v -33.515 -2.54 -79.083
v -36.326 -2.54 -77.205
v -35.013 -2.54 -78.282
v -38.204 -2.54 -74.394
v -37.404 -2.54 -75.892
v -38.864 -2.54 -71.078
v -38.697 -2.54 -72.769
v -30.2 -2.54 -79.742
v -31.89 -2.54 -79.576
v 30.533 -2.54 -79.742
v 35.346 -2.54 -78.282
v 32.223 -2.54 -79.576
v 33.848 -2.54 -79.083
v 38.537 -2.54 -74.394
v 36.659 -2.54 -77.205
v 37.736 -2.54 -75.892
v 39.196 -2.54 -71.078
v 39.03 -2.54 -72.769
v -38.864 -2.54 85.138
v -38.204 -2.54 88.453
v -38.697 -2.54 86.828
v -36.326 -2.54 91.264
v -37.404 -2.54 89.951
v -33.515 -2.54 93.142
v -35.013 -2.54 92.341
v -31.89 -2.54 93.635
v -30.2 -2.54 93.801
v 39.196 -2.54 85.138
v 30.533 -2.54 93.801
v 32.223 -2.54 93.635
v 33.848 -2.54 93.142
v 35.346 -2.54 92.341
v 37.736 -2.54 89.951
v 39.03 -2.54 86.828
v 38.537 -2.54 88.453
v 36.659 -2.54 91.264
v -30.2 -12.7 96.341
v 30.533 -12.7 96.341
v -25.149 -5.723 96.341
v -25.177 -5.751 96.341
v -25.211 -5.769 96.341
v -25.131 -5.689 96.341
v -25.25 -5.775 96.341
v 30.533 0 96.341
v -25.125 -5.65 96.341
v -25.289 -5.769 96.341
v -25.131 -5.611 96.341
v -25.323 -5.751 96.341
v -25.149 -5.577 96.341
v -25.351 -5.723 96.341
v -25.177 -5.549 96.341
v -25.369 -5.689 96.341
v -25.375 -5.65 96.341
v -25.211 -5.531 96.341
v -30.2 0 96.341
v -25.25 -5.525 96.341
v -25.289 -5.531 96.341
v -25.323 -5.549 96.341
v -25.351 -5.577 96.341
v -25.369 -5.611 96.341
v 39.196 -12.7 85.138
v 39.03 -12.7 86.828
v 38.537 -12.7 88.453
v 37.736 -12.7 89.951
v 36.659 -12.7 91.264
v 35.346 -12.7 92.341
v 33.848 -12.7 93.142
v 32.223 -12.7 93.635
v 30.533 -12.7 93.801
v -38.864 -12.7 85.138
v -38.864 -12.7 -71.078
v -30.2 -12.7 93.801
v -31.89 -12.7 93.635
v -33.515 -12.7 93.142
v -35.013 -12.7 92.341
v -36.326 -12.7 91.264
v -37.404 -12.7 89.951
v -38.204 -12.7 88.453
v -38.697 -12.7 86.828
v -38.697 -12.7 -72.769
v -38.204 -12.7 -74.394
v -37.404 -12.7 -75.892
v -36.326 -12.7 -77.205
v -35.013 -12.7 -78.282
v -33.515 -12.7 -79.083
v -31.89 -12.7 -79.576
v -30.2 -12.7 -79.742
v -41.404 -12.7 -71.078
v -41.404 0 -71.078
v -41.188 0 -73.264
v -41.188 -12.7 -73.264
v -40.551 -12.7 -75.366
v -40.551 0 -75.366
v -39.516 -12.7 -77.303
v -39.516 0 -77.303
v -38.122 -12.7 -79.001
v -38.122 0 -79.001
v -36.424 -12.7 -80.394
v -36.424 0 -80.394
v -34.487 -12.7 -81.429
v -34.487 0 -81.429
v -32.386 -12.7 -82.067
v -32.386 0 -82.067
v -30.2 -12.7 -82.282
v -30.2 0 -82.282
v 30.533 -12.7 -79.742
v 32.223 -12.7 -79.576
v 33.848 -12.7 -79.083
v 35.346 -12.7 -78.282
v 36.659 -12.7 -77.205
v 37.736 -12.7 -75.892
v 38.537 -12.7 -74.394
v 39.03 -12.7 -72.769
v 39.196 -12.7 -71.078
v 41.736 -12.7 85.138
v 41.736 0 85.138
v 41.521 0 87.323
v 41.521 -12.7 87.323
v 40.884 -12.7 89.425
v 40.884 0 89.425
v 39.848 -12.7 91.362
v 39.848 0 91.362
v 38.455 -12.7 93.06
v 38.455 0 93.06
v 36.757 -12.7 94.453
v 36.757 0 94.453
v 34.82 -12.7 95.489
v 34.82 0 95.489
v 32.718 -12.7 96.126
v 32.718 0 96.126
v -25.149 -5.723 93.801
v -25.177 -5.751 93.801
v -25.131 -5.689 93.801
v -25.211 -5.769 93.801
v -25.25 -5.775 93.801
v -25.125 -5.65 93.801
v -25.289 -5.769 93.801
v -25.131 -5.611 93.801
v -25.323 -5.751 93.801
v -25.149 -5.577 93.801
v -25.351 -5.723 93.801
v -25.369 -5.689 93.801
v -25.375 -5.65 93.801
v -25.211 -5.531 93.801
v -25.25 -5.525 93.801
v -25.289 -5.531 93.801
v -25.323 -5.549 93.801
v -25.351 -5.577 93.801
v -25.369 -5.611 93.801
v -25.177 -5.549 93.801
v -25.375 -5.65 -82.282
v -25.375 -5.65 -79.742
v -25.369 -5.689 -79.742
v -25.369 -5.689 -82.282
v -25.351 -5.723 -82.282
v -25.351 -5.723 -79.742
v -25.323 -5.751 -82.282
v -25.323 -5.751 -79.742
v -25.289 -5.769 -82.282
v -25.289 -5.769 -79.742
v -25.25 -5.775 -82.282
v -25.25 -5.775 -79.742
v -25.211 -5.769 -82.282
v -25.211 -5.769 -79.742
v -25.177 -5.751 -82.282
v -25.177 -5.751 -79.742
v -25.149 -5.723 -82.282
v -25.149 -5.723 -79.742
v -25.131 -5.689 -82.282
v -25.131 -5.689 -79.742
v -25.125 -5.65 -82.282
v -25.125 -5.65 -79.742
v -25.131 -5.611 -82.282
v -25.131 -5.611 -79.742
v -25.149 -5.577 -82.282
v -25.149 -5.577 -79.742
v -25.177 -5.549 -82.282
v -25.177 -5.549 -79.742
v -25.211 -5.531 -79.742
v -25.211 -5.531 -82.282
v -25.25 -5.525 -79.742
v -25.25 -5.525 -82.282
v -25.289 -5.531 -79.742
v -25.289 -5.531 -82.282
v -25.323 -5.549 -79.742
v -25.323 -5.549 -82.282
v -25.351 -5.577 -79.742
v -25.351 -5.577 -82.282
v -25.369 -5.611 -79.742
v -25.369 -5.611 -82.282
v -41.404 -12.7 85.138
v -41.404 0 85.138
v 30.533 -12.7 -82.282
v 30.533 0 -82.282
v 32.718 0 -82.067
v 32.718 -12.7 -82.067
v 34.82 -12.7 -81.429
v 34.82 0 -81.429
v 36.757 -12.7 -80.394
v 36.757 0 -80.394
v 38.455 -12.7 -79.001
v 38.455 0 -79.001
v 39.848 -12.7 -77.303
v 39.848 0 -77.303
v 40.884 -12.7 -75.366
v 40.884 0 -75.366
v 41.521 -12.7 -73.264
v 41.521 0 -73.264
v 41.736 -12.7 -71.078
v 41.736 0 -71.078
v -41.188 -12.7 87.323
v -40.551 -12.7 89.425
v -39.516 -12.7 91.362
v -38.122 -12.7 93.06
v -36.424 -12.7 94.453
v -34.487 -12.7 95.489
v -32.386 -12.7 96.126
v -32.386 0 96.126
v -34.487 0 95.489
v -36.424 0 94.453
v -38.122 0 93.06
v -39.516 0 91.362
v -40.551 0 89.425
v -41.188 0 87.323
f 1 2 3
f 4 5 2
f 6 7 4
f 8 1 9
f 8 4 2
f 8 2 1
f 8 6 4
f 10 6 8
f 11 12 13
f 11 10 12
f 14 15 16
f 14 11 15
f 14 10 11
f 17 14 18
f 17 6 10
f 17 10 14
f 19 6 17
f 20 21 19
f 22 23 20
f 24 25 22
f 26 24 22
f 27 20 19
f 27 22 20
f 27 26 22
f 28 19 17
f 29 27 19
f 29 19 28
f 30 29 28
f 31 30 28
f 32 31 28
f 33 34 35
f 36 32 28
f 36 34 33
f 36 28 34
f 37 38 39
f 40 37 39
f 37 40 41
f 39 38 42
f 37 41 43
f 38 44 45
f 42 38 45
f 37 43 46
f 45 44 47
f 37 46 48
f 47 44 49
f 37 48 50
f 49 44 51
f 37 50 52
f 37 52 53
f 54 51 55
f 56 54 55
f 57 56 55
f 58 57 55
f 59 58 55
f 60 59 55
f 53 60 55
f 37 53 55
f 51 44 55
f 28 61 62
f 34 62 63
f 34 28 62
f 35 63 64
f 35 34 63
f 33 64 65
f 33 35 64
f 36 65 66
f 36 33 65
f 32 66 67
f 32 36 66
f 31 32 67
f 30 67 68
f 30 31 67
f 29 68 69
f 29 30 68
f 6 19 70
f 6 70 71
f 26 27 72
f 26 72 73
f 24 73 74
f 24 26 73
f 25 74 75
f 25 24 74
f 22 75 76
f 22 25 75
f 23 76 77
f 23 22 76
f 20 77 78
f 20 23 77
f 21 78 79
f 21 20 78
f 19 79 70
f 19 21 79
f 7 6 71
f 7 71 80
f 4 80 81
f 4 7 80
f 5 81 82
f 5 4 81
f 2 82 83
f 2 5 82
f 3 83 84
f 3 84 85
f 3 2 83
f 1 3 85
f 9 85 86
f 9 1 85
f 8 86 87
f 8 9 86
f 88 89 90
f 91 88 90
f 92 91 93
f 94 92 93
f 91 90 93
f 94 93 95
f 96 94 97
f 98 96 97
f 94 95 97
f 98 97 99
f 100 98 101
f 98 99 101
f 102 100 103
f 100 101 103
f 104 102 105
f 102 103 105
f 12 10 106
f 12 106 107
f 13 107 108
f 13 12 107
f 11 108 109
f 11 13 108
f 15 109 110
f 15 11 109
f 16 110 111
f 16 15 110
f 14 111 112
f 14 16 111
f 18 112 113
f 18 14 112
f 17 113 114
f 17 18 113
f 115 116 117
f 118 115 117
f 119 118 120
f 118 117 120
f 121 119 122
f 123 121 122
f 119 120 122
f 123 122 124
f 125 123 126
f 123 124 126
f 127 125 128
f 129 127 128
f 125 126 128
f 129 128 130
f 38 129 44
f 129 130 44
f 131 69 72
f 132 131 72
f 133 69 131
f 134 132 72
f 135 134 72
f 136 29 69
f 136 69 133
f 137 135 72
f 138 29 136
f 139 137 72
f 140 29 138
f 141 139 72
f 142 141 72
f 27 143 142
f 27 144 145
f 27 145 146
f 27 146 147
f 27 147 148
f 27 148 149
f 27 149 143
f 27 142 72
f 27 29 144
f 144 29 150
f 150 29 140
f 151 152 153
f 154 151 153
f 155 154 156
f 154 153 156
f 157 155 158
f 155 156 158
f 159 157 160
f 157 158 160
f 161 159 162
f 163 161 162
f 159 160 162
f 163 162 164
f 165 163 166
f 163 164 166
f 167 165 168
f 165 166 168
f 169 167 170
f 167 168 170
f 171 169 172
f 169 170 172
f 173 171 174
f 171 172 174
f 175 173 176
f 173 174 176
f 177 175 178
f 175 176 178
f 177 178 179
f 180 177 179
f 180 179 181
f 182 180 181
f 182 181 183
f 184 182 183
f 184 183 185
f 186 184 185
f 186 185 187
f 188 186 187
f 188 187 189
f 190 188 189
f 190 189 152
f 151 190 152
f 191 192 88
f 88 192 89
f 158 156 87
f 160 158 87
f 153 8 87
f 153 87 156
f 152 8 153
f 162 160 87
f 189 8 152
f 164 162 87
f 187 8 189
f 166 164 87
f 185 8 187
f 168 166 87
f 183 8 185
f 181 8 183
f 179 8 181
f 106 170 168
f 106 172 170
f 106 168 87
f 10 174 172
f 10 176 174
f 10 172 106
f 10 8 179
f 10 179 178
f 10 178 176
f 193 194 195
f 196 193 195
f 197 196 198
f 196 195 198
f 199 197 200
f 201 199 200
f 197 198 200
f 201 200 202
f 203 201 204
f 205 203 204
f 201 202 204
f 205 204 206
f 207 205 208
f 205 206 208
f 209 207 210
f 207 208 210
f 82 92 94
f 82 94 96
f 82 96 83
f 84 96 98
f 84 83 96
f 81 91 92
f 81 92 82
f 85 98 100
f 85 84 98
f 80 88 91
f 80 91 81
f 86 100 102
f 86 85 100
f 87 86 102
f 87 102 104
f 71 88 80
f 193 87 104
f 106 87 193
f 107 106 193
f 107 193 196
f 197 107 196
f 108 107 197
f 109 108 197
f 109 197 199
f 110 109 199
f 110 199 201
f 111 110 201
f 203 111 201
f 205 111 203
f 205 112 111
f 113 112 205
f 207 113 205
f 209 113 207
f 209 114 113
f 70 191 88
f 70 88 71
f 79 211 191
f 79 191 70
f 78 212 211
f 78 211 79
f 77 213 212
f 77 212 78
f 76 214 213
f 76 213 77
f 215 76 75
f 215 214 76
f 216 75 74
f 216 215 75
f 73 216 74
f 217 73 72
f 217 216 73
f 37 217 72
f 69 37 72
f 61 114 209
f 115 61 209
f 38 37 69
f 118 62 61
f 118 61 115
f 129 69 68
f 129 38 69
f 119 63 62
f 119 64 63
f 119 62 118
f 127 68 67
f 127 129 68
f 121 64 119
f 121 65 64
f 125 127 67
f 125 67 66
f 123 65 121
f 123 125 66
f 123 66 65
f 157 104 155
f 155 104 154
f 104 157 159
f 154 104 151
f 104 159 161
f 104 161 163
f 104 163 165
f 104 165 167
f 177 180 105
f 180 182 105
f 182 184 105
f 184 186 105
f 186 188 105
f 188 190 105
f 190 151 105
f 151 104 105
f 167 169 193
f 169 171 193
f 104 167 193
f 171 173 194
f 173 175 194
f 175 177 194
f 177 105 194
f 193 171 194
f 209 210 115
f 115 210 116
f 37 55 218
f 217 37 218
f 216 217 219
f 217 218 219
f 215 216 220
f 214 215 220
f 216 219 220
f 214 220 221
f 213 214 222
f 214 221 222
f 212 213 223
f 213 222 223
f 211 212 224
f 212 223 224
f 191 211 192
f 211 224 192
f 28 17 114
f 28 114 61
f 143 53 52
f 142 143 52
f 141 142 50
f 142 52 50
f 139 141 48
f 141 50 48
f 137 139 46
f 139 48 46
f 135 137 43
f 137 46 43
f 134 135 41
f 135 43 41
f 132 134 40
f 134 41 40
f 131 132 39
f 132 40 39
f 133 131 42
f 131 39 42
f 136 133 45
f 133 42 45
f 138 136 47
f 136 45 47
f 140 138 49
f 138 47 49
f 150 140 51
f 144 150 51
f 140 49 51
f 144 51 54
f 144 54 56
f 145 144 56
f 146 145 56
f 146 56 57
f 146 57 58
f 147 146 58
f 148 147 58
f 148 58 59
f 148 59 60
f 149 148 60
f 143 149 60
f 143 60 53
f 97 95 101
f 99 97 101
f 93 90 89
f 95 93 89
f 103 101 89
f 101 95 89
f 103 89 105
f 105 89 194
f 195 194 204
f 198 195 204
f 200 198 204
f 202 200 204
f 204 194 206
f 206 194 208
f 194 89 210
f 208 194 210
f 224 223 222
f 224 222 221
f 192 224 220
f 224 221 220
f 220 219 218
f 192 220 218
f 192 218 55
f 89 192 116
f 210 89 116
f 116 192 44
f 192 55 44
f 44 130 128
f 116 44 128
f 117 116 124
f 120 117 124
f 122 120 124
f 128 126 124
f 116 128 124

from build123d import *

# Parameters (mm, degrees)
F1_DEPTH       = 12.7
F2_T           = -2.54
F4_D           = 0.25
F4_CBORE_D     = 12.7
F4_CBORE_DEPTH = 0


with BuildPart() as f1:
    # F0 (on Front) → F1 (new body)
    with BuildSketch(Plane.XZ):
        with BuildLine():
            Line((30.532771, 96.341363), (-30.200021, 96.341363))
            ThreePointArc((-30.200021, 96.341363), (-38.122194, 93.059891), (-41.403666, 85.137717))
            Line((-41.403666, 85.137717), (-41.403666, -71.078406))
            ThreePointArc((-41.403666, -71.078406), (-38.122194, -79.00058), (-30.200021, -82.282051))
            Line((-30.200021, -82.282051), (30.532771, -82.282051))
            ThreePointArc((30.532771, -82.282051), (38.454945, -79.00058), (41.736417, -71.078406))
            Line((41.736417, -71.078406), (41.736417, 85.137717))
            ThreePointArc((41.736417, 85.137717), (38.454945, 93.059891), (30.532771, 96.341363))
        make_face()
    extrude(amount=F1_DEPTH)

    # F2
    f2_openings = [f1.faces().sort_by_distance(p)[0] for p in [
        (0.166375, -12.7, 7.029656),
    ]]
    offset(amount=F2_T, openings=f2_openings)

    # F4 (through all)
    with Locations(Plane(origin=(0, 0, -82.282051), x_dir=(1, 0, 0), z_dir=(0, 0, -1))):
        with Locations((-25.25001, 5.65)):
            CounterBoreHole(F4_D / 2, F4_CBORE_D / 2, F4_CBORE_DEPTH)


solid = f1.part
